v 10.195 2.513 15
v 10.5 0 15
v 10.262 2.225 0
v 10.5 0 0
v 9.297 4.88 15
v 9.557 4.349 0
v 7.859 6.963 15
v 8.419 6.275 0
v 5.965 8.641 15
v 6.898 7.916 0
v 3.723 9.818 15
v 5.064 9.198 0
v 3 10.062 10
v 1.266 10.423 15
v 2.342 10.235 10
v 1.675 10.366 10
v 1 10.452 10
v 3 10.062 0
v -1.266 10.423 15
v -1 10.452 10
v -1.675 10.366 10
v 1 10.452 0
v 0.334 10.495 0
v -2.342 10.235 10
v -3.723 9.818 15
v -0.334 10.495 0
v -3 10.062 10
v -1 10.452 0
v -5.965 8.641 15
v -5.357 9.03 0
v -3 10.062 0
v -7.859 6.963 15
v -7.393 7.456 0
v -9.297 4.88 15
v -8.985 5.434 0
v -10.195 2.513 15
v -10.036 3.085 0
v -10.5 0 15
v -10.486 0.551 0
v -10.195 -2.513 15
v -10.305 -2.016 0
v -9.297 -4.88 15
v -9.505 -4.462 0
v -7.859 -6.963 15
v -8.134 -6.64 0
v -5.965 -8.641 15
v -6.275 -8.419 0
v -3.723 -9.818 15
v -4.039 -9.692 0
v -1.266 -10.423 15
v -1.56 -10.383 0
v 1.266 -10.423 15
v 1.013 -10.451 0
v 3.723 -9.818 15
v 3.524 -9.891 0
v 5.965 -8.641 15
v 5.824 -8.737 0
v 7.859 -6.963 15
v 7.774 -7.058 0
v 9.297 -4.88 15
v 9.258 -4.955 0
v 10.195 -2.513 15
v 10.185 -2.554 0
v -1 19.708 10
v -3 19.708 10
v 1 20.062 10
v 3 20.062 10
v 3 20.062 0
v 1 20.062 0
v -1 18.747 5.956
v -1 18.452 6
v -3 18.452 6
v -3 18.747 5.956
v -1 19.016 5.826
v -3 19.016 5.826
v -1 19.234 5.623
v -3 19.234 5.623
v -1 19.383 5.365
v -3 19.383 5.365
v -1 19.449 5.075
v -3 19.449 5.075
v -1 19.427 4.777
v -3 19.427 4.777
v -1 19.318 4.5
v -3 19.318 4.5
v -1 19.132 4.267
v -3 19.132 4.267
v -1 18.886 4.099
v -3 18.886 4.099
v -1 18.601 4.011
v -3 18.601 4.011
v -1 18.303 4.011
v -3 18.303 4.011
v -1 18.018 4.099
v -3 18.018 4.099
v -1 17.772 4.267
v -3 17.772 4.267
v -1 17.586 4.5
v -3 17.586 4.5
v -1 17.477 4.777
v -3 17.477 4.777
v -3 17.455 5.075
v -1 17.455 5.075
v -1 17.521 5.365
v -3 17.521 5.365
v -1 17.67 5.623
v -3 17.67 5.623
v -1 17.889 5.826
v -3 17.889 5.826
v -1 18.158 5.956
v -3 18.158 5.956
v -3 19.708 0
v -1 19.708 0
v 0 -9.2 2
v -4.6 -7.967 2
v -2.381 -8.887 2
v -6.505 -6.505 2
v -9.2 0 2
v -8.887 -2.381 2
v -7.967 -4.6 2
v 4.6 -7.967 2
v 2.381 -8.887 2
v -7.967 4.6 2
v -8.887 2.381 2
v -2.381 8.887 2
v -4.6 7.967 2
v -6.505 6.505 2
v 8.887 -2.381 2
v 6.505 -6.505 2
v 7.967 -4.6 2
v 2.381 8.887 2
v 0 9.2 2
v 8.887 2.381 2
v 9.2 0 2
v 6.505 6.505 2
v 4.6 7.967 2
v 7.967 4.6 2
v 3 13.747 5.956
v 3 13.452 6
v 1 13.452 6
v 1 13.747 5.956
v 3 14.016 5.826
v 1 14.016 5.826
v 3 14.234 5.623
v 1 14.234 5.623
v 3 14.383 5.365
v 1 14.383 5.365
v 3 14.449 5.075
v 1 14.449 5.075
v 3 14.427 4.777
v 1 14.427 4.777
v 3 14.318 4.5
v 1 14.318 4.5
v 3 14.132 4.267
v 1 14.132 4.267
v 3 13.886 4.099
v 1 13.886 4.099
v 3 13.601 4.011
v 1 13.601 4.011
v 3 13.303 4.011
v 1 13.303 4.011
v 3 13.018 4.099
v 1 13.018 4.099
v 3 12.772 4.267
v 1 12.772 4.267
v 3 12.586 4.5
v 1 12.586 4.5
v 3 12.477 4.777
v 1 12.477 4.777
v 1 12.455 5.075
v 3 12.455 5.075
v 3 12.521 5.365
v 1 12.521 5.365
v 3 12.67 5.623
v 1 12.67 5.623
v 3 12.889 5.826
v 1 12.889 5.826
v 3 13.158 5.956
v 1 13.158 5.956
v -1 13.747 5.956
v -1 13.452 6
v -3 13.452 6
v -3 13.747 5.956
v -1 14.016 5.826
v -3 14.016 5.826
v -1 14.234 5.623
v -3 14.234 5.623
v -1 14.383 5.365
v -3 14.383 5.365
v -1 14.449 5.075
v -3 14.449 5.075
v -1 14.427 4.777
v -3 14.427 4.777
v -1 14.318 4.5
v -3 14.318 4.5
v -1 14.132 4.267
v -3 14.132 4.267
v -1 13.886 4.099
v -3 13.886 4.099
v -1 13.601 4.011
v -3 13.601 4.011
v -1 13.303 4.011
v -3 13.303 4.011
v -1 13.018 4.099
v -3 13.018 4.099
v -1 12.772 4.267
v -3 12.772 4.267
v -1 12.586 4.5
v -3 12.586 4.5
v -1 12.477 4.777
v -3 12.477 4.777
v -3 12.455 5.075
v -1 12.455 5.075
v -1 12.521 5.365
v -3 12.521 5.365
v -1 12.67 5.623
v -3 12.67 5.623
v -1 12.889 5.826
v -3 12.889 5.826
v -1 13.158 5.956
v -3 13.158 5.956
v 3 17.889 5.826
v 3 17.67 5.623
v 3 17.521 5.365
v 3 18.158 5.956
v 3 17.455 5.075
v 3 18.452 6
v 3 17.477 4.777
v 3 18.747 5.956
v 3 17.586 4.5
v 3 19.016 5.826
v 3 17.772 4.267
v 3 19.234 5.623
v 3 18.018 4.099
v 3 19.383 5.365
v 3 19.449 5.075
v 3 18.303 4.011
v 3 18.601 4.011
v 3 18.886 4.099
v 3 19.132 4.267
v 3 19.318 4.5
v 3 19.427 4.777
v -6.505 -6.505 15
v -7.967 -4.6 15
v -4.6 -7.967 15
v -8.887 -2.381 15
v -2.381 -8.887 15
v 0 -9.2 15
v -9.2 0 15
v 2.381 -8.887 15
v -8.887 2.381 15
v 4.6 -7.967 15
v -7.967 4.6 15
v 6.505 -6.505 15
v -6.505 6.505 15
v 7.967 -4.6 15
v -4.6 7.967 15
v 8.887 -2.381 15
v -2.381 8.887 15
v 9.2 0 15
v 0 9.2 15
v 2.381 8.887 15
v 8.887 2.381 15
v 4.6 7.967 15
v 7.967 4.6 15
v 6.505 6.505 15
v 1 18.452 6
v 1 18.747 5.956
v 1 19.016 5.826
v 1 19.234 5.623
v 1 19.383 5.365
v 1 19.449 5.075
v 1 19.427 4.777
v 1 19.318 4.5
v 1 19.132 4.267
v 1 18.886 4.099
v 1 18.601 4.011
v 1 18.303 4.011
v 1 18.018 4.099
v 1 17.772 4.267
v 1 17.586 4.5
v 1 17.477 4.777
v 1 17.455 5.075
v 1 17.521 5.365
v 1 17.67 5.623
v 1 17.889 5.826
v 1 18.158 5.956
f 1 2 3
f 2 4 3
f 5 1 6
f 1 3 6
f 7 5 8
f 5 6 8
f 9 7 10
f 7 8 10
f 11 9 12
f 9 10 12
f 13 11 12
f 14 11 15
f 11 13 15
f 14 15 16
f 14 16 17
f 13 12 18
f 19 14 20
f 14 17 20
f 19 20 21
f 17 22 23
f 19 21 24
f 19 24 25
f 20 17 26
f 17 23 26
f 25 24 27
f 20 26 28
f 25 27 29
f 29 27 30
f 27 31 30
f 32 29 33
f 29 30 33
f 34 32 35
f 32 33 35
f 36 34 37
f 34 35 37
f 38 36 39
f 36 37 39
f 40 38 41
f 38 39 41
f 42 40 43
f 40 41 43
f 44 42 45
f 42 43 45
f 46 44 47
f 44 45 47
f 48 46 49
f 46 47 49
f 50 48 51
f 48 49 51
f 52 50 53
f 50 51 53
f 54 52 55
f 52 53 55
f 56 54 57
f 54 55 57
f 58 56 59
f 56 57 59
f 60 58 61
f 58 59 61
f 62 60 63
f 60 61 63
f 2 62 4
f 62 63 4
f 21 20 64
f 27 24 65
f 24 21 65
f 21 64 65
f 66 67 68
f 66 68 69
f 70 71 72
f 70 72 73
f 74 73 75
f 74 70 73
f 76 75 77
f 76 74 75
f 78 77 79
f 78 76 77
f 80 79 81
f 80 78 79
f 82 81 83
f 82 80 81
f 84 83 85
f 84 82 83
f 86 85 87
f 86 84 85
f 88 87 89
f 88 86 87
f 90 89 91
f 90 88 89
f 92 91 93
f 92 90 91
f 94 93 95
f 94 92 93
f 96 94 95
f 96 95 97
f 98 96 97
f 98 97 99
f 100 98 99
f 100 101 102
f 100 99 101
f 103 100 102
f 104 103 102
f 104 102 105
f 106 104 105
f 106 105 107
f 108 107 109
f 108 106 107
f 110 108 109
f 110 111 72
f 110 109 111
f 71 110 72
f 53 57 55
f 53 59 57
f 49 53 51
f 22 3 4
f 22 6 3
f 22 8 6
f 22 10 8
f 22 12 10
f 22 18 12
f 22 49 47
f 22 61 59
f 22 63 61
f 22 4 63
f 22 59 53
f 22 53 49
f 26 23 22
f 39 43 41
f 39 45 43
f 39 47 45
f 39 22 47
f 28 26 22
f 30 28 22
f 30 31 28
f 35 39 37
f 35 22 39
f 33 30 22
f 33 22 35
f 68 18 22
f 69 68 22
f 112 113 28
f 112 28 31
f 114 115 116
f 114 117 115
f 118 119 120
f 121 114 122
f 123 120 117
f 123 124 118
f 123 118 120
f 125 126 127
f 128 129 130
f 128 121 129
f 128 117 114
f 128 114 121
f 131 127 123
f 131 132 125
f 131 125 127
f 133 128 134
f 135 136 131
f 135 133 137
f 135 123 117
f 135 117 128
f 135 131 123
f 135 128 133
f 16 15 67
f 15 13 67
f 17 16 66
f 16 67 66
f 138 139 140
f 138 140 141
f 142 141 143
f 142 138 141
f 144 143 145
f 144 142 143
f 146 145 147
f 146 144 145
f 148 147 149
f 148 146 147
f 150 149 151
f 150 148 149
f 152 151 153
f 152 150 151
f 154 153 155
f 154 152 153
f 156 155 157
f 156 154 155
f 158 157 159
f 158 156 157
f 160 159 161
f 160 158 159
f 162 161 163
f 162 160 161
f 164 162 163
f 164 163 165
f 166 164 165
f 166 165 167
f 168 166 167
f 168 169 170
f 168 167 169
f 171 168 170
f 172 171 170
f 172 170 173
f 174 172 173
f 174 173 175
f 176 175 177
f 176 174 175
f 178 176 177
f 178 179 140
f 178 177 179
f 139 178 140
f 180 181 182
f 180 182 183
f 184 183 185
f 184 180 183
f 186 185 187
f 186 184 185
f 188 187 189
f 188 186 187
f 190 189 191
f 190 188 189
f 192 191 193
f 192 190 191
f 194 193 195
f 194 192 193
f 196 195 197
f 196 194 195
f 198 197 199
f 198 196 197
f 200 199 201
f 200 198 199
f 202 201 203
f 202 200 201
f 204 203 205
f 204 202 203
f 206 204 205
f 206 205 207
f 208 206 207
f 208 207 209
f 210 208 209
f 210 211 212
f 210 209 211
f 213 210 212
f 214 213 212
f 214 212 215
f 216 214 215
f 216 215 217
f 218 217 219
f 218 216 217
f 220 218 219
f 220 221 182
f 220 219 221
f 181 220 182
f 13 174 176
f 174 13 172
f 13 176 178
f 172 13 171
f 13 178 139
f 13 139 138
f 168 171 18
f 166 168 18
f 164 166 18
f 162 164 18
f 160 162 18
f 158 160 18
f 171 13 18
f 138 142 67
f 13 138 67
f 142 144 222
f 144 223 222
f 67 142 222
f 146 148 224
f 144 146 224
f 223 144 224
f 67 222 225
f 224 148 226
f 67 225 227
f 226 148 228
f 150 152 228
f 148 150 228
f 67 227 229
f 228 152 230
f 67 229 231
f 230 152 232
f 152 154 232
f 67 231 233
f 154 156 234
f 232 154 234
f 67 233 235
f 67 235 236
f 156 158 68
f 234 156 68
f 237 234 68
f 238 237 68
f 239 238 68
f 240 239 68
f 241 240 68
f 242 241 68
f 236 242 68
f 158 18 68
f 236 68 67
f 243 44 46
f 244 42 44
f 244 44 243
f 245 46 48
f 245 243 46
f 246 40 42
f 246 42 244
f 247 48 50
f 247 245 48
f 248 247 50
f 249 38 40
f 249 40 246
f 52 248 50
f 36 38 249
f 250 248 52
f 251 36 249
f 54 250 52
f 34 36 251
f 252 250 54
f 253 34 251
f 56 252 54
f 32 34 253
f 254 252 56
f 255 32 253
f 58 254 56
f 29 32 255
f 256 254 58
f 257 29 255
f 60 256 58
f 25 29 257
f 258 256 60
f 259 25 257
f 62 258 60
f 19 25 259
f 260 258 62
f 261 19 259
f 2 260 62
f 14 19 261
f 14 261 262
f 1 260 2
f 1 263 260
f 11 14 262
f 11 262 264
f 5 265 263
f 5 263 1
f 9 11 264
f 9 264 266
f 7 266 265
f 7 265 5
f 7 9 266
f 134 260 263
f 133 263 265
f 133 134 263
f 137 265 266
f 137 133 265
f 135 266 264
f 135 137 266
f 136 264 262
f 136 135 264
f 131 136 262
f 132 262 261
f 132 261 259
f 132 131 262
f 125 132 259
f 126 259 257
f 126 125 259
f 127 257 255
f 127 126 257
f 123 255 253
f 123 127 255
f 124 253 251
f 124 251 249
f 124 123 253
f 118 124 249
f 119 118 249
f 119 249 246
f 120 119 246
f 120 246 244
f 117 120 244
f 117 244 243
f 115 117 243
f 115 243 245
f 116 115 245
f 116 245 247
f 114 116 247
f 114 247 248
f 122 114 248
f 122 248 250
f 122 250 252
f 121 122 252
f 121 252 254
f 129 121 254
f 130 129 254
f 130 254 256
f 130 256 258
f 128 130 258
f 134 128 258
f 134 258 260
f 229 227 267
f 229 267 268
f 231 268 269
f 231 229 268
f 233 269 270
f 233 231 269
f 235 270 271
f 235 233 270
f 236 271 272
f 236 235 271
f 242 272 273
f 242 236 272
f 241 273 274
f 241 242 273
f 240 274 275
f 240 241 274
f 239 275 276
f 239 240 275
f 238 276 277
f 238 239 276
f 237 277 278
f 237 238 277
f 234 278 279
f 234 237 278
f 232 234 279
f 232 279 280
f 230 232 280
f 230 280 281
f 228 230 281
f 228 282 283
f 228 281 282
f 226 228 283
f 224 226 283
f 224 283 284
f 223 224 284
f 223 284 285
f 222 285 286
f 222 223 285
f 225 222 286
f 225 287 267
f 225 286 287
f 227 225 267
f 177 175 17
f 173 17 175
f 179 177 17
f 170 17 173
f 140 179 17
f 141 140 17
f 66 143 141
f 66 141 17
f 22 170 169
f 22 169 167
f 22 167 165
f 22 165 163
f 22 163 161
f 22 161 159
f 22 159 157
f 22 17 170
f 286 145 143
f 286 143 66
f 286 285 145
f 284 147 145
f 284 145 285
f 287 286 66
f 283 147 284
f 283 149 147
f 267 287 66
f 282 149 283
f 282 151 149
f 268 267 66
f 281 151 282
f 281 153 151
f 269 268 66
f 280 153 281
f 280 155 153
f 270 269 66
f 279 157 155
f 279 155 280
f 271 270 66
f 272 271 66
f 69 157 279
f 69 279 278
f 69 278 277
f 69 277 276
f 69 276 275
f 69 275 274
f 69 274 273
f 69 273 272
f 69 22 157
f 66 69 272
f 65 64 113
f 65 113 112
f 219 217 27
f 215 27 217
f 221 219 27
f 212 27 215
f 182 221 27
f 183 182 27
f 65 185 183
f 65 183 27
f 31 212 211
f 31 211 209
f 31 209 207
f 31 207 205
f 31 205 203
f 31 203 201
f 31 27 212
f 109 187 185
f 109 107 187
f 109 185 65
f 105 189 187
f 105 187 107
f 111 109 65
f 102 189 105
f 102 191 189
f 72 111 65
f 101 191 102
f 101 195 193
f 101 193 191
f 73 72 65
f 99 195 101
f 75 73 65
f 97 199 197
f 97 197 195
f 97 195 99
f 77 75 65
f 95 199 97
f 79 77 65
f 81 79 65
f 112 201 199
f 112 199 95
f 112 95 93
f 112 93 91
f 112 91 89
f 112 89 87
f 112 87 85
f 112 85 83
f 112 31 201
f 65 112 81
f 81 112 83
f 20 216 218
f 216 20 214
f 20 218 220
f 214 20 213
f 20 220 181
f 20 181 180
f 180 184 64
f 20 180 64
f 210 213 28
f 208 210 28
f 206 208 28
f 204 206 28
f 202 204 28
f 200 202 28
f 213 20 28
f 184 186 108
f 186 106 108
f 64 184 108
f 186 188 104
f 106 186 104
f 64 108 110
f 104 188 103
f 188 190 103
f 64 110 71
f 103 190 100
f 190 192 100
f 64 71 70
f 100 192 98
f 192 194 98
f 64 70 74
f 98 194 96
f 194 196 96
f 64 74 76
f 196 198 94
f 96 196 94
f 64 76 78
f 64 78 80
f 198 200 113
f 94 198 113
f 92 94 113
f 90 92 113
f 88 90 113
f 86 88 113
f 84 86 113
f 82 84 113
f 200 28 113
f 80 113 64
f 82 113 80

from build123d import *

# Parameters (mm, degrees)
SKETCH5_R               = 10.5
SKETCH5_R_2             = 9.2
BOSS_EXTRUDE1_DEPTH     = 15
SKETCH6_R               = 10.5
BOSS_EXTRUDE2_DEPTH     = 2
SKETCH7_W               = 2
SKETCH7_H               = 10
EXTRUDE_THIN1_DEPTH     = 10
SKETCH8_W               = 2
SKETCH8_H               = 9.64593802
EXTRUDE_THIN2_DEPTH     = 10
CUT_EXTRUDE1_DEPTH      = 29.456038339
CUT_EXTRUDE1_DEPTH_BACK = 29.456038339
SKETCH9_R               = 1


with BuildPart() as part:
    # Sketch5 → Boss-Extrude1 (new body)
    with BuildSketch(Plane.XY):
        Circle(SKETCH5_R)
        Circle(SKETCH5_R_2, mode=Mode.SUBTRACT)
    extrude(amount=BOSS_EXTRUDE1_DEPTH)

    # Sketch6 → Boss-Extrude2 (add)
    with BuildSketch(Plane.XY):
        Circle(SKETCH6_R)
    extrude(amount=BOSS_EXTRUDE2_DEPTH)

    # Sketch7 → Extrude-Thin1 (add)
    with BuildSketch(Plane(origin=(0, 0, 0), x_dir=(-1, 0, 0), z_dir=(0, 0, -1))):
        with Locations((-2, 15.062305899)):
            Rectangle(SKETCH7_W, SKETCH7_H)
    extrude(amount=-EXTRUDE_THIN1_DEPTH)

    # Sketch8 → Extrude-Thin2 (add)
    with BuildSketch(Plane(origin=(0, 0, 0), x_dir=(-1, 0, 0), z_dir=(0, 0, -1))):
        with Locations((2, 14.885274909)):
            Rectangle(SKETCH8_W, SKETCH8_H)
    extrude(amount=-EXTRUDE_THIN2_DEPTH)

    # Sketch9 → Cut-Extrude1 (cut, two sides: drawn at the far end of the back side and taken through both)
    with BuildSketch(Plane.ZY.offset(3).offset(-CUT_EXTRUDE1_DEPTH_BACK)):
        with Locations((5, 13.45227248)):
            Circle(SKETCH9_R)
        with Locations((5, 18.45227248)):
            Circle(SKETCH9_R)
    extrude(amount=CUT_EXTRUDE1_DEPTH + CUT_EXTRUDE1_DEPTH_BACK, mode=Mode.SUBTRACT)


solid = part.part
